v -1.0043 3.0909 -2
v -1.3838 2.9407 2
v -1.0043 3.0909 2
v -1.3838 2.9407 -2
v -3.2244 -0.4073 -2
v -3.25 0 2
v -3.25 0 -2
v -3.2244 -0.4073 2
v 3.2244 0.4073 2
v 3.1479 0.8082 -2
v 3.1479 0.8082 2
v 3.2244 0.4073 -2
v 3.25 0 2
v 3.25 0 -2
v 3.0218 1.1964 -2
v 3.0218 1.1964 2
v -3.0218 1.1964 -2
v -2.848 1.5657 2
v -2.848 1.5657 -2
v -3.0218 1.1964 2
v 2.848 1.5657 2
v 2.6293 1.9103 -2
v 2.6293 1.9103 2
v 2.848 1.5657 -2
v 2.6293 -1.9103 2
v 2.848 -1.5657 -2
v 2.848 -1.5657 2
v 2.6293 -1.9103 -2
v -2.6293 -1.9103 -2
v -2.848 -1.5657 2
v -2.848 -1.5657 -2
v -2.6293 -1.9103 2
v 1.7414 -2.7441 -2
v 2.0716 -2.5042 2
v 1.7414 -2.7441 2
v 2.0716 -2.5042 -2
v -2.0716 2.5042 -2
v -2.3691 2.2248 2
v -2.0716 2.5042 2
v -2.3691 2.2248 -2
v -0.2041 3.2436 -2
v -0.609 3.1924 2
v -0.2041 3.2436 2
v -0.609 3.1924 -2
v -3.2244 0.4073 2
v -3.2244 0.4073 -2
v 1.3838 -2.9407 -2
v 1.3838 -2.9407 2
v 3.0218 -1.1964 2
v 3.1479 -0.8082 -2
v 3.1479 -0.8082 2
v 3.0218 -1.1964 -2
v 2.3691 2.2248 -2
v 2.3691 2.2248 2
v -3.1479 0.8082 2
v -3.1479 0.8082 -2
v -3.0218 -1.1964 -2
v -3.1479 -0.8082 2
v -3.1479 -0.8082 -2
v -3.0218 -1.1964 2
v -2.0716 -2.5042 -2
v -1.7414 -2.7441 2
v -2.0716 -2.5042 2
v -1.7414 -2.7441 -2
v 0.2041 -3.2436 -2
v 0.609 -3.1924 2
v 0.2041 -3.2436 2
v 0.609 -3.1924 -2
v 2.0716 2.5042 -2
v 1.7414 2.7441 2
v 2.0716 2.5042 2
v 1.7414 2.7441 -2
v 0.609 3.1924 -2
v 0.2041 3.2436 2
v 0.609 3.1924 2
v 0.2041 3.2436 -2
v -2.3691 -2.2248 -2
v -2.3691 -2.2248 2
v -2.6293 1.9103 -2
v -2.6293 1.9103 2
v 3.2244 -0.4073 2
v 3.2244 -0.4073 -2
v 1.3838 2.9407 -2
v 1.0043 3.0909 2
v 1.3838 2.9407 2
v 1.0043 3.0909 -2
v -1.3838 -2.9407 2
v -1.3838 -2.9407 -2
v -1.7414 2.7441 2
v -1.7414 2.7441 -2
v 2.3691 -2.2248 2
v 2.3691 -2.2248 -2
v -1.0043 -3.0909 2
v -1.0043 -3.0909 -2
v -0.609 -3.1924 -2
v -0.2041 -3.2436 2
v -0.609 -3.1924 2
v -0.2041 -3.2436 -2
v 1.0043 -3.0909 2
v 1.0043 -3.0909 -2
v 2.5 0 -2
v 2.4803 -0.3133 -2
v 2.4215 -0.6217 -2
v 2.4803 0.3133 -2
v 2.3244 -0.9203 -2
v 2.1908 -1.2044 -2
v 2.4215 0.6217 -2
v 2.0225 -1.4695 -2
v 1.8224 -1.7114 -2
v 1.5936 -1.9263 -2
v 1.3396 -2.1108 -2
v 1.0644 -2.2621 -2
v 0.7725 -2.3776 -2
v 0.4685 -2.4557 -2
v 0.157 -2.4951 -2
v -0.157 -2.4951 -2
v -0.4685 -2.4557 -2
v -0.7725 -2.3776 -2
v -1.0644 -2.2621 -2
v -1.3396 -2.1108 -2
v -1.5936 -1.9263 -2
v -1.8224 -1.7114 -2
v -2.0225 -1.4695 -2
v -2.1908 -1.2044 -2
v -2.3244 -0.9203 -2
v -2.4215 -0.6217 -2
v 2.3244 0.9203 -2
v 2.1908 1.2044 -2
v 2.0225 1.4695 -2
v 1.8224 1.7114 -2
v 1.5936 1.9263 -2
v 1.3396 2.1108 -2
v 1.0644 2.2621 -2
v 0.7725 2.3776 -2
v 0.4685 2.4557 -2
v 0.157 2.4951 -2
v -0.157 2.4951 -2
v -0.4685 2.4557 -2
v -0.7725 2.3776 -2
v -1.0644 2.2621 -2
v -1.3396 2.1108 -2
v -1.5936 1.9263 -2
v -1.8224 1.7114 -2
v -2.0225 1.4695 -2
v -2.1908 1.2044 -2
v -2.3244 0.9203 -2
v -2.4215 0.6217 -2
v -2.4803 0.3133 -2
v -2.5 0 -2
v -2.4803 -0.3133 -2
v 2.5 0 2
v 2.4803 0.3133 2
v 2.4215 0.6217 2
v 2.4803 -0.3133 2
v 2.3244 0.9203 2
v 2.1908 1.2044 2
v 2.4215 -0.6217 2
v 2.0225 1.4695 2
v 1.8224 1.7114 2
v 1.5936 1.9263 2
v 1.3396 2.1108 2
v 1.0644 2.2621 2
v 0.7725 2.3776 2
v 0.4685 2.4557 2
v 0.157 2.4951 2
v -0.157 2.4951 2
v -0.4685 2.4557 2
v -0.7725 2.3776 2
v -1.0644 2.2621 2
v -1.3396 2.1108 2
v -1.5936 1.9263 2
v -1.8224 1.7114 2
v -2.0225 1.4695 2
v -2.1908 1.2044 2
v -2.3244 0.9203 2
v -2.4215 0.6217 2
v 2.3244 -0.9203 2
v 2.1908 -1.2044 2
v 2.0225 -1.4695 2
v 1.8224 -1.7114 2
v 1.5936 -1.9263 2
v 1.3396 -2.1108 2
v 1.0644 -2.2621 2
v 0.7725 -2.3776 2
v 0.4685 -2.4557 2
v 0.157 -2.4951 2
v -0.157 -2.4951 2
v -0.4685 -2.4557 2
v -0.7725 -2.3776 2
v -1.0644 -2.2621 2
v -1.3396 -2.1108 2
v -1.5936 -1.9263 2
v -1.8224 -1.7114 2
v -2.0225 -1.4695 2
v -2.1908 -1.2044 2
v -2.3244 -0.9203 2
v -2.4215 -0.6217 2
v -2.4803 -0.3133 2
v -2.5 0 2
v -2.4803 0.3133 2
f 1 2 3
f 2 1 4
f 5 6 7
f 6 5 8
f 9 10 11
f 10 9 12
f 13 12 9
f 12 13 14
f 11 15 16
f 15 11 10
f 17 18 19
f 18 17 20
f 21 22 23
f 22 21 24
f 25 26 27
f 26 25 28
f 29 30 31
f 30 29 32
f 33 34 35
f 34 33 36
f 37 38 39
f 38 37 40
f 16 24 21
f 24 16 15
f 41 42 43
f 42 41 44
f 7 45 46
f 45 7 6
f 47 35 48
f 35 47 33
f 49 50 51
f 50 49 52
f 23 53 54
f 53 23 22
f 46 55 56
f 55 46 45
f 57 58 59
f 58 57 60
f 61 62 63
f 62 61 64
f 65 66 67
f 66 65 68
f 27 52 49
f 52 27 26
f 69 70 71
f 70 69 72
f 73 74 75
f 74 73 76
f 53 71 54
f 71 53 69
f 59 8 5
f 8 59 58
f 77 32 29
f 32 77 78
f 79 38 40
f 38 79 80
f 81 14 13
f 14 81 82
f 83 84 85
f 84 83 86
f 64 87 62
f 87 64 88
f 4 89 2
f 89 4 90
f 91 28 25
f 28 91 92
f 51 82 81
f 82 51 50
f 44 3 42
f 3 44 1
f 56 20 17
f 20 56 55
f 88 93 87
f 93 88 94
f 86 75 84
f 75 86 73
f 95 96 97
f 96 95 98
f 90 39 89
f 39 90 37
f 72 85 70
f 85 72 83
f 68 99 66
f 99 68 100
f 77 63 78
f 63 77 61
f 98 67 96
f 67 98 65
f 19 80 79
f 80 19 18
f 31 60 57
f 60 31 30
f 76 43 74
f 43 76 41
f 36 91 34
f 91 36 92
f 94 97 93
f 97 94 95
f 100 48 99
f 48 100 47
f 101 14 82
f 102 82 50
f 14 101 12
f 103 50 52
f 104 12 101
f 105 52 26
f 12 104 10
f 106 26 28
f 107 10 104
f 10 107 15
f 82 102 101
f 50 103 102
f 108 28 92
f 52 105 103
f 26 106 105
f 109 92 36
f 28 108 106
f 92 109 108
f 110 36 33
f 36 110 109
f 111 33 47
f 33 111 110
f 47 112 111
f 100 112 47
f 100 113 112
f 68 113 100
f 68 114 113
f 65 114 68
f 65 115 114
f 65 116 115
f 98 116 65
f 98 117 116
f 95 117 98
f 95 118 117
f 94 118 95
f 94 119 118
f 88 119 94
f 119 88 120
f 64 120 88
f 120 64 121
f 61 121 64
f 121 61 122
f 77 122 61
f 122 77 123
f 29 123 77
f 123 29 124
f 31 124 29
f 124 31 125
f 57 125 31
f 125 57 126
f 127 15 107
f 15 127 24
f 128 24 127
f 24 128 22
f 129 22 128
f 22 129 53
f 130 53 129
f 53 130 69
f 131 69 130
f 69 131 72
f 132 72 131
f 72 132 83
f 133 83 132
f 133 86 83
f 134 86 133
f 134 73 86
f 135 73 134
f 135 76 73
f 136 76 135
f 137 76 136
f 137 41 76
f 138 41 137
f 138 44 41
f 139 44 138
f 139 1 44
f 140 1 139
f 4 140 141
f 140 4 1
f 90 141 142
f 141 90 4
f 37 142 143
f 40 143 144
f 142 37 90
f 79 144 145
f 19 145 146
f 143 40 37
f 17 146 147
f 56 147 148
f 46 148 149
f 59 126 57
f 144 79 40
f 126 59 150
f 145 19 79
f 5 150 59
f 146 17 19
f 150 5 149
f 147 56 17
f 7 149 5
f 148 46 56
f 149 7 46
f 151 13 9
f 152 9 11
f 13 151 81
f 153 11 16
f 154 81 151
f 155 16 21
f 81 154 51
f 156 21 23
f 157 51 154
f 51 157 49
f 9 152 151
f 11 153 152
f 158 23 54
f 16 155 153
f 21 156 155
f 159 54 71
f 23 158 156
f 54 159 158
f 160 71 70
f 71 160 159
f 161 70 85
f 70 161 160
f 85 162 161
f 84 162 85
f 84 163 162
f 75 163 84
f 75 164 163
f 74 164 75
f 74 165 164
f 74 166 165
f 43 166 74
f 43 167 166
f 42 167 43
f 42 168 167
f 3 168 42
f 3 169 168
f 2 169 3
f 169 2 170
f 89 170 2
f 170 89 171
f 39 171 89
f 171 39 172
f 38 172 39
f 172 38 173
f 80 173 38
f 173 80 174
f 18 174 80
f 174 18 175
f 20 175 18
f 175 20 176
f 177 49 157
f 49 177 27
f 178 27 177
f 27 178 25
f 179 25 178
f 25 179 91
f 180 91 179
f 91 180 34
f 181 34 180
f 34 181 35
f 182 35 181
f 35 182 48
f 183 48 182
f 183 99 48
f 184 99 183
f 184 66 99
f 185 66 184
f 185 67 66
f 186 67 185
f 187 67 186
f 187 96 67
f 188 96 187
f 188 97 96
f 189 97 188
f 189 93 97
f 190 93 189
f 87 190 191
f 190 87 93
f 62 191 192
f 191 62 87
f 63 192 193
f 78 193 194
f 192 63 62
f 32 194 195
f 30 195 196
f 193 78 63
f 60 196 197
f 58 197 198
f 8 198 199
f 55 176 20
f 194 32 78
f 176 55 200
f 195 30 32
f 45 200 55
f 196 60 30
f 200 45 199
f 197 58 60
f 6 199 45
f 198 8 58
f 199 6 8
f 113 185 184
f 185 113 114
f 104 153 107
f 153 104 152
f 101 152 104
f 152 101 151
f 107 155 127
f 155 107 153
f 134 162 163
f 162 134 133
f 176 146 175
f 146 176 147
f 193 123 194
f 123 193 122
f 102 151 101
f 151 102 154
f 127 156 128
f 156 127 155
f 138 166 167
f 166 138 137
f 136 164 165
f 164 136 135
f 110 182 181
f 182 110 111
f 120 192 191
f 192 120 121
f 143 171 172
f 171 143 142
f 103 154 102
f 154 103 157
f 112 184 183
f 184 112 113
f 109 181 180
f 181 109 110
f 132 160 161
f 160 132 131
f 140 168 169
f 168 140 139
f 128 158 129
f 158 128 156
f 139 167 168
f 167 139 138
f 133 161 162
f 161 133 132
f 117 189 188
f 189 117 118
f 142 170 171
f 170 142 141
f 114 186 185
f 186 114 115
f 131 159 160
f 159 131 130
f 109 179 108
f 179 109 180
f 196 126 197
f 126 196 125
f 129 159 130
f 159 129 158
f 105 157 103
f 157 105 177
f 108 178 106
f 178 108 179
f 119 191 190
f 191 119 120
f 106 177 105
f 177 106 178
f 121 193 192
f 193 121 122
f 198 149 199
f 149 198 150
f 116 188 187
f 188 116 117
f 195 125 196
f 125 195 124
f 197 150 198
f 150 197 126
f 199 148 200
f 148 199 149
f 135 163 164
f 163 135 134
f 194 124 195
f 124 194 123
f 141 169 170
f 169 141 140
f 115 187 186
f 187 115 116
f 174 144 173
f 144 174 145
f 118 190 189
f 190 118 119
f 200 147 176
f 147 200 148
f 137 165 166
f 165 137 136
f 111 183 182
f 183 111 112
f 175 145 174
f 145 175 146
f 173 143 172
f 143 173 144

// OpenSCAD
$fn = 50;


difference() {
	union() {
		translate(v = [0, 0, -2.0000000000]) {
			cylinder(h = 4, r = 3.2500000000);
		}
	}
	union() {
		translate(v = [0, 0, -100.0000000000]) {
			cylinder(h = 200, r = 2.5000000000);
		}
	}
}
